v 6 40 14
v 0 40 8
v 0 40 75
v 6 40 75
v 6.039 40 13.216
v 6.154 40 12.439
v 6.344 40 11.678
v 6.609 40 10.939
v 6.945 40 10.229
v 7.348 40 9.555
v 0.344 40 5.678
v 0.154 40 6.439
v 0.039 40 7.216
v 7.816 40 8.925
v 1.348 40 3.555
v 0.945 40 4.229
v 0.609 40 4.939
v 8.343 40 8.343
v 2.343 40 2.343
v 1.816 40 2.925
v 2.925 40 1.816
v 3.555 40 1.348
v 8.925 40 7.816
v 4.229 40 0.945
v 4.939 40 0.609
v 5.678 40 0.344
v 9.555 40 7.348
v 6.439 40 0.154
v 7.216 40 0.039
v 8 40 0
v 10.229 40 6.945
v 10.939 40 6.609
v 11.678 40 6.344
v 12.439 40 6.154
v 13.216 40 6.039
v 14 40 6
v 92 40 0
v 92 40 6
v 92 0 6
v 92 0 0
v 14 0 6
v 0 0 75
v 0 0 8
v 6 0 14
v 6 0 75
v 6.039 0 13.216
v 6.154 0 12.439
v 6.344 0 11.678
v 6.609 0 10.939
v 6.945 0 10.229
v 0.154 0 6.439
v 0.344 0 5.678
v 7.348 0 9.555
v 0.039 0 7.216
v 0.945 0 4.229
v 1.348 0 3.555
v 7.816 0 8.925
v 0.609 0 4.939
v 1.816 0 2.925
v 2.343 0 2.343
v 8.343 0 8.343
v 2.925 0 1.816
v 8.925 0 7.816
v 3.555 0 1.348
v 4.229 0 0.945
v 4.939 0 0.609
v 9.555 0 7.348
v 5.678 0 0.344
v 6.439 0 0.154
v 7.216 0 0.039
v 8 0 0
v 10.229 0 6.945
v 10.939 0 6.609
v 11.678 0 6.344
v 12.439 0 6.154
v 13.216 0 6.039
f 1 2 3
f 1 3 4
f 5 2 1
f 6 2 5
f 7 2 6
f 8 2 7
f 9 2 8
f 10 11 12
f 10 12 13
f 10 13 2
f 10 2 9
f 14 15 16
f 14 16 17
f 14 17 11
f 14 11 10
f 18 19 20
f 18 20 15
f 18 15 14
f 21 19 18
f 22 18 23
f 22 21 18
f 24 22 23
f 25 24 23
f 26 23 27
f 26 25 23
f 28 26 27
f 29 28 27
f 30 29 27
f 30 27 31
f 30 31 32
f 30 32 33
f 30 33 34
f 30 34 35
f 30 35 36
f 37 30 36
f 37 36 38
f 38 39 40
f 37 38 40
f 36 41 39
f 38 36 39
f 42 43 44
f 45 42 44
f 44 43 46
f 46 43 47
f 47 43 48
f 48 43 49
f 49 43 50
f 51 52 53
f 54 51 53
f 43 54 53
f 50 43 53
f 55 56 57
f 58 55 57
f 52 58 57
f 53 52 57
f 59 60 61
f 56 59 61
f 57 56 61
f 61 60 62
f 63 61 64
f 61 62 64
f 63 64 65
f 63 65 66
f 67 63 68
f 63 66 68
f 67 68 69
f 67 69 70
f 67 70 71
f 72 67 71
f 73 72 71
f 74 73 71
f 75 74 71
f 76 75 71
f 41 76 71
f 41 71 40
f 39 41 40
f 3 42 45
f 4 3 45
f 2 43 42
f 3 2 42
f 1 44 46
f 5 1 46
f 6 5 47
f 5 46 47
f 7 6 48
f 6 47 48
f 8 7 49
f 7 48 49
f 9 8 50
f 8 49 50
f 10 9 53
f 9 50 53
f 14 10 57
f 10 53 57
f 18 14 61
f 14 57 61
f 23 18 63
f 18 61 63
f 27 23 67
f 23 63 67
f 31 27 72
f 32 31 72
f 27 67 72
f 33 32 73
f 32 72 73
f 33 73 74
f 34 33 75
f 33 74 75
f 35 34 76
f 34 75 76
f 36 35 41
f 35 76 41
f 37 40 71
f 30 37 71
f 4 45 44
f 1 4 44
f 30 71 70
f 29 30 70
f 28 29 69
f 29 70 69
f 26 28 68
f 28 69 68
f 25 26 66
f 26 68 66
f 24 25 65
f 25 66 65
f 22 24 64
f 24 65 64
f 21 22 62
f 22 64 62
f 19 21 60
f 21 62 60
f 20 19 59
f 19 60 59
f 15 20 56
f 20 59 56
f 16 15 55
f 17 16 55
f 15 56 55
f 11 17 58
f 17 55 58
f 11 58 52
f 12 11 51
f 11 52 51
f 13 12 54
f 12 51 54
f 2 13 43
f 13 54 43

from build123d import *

# Parameters (mm, degrees)
EXTRUDE_1_DEPTH = 40


with BuildPart() as part:
    # 草图1 → 凸台-拉伸1 (new body)
    with BuildSketch(Plane(origin=(0, 0, 0), x_dir=(1, 0, 0), z_dir=(0, 1, 0))):
        with BuildLine():
            Line((0, -8), (0, -75))
            Line((0, -75), (6, -75))
            Line((6, -75), (6, -14))
            ThreePointArc((6, -14), (8.343145751, -8.343145751), (14, -6))
            Line((14, -6), (92, -6))
            Line((92, -6), (92, 0))
            Line((92, 0), (8, 0))
            ThreePointArc((8, 0), (2.343145751, -2.343145751), (0, -8))
        make_face()
    extrude(amount=EXTRUDE_1_DEPTH)


solid = part.part
